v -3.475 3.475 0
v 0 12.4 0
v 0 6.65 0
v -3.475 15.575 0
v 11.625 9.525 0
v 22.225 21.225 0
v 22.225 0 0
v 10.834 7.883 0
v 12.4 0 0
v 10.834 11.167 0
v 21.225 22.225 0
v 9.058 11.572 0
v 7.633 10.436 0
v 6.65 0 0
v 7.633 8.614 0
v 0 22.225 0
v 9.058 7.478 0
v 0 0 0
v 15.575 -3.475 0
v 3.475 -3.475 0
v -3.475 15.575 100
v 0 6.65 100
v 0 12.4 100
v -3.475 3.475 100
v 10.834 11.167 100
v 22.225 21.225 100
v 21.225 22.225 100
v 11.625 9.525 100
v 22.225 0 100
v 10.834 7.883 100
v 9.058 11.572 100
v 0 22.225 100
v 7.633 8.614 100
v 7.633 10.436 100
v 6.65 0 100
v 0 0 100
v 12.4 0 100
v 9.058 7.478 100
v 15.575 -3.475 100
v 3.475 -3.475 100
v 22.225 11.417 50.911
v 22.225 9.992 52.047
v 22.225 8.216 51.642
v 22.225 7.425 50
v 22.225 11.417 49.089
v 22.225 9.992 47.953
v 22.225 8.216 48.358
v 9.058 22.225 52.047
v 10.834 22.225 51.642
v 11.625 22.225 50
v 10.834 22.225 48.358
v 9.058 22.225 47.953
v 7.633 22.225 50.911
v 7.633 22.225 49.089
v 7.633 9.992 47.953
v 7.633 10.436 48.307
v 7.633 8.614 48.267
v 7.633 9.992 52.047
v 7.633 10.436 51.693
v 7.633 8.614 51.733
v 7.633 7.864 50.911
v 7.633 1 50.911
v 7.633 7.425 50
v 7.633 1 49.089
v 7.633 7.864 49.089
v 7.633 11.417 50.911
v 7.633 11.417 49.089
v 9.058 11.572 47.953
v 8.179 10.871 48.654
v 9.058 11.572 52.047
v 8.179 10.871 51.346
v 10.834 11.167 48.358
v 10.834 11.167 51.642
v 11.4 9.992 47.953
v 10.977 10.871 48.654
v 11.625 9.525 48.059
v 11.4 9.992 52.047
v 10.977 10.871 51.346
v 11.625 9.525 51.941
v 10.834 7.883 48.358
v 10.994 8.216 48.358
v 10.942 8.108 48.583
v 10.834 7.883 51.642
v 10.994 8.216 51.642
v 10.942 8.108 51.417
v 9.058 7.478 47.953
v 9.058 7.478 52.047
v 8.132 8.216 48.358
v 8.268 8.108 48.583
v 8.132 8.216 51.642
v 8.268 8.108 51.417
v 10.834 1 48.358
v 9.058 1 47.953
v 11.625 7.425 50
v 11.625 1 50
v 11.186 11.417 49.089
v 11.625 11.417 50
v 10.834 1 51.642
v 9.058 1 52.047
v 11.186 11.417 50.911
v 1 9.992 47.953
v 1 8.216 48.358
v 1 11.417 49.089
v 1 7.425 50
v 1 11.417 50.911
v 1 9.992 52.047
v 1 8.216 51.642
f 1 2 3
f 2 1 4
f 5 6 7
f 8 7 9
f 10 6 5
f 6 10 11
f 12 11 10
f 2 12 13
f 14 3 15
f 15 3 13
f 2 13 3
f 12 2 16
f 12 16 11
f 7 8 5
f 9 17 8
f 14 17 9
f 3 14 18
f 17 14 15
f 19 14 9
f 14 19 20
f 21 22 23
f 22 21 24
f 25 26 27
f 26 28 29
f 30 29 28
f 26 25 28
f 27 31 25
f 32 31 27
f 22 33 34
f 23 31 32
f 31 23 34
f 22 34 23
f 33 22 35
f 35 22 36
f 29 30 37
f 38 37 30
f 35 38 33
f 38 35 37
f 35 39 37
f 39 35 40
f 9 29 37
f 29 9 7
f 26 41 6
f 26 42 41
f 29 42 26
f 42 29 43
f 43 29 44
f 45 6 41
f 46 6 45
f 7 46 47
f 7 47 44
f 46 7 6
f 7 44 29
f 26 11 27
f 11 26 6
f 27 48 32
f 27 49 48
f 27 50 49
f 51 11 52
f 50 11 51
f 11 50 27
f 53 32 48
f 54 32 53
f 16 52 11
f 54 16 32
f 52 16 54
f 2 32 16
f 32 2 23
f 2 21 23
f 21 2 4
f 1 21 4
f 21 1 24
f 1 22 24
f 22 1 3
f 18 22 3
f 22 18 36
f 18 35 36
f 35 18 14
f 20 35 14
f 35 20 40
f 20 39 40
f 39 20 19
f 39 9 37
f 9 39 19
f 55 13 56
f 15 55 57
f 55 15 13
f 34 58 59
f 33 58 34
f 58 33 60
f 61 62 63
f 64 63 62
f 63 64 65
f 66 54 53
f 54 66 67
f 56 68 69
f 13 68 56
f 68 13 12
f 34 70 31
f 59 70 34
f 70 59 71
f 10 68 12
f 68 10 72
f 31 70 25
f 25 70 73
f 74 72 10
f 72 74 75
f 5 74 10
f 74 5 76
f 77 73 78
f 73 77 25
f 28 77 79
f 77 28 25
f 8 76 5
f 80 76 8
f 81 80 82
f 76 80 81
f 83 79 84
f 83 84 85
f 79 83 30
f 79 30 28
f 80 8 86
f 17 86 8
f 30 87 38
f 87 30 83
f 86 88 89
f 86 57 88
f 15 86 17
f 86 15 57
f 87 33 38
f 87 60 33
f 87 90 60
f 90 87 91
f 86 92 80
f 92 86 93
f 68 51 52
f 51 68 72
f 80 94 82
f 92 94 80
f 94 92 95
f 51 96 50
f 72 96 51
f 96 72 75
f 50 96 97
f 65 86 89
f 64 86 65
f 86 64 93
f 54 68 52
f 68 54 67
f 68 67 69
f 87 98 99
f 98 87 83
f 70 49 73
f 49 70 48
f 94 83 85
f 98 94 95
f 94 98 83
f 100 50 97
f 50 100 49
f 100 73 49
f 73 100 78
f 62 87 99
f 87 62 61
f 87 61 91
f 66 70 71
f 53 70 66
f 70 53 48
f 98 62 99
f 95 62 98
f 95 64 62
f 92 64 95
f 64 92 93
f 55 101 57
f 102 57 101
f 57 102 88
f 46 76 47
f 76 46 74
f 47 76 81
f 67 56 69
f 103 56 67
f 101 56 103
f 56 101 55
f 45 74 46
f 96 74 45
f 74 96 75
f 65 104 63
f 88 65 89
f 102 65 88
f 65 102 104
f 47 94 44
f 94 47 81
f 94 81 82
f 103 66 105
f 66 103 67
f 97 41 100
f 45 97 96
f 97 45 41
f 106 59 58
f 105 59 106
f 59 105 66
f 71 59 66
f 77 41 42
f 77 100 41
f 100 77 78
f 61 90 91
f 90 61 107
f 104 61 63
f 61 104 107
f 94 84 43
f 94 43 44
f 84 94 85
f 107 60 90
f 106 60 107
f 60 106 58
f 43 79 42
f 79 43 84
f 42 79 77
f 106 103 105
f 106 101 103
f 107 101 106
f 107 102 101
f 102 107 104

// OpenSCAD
include <MCAD/units.scad>
use <MCAD/metric_fastners.scad>

// Height in mm
height = 100;

// Dovetail on second side?
dovetail = true;

// Bolt holes on second side?
bolts = false;

hole_dia = 4.2 * mm; // drill size for 5mm tap
width = (7/8) * inch;
tol = 0.3 * mm;

difference() {
  linear_extrude(height) {
    difference() {
      if (dovetail) {
        poly = [
          [0, 0],
          [0, ((1/4) * inch) + tol],
          [(-(1/8) * inch) - tol, ((1/8) * inch) + tol],
          [(-(1/8) * inch) - tol, ((5/8) * inch) - tol],
          [0, ((1/2) * inch) - tol],
          [0, width], [width - 1, width],
          [width, width - 1],
          [width, 0],
          [((1/2) * inch) - tol, 0],
          [((5/8) * inch) - tol, (-(1/8) * inch) - tol],
          [((1/8) * inch) + tol, (-(1/8) * inch) - tol], 
          [((1/4) * inch) + tol, 0], [0,0]];
        polygon(poly);
      } else {
        poly = [
          [0, 0],
          [0, ((1/4) * inch) + tol],
          [(-(1/8) * inch) - tol, ((1/8) * inch) + tol],
          [(-(1/8) * inch) - tol, ((5/8) * inch) - tol],
          [0, ((1/2) * inch) - tol],
          [0, width],
          [width - 1, width],
          [width, width - 1],
          [width, 1],
          [width - 1, 0],
          [0,0]];
        polygon(poly);
      }
      translate([(3/8) * inch, (3/8) * inch])
        circle(d = hole_dia);
    };
  }
  
  translate([(3/8) * inch, dovetail ? 1 : -1, height / 2])
    rotate([-90, 0, 0])
    cylinder(h = width * 2 + 2, d = hole_dia);
  translate([1, (3/8) * inch, height / 2])
    rotate([-90, 0, -90])
    cylinder(h = width * 2 + 2, d = hole_dia);

  if (bolts) {
    translate([(1/8) * inch, width, (1/2) * inch])
      rotate([90, 0, 0])
      csk_bolt(3, width + 4);
    translate([(5/8) * inch, width, (1/2) * inch])
      rotate([90, 0, 0])
      csk_bolt(3, width + 4);
    
    translate([(1/8) * inch, width, height - ((1/2) * inch)])
      rotate([90, 0, 0])
      csk_bolt(3, width + 4);
    translate([(5/8) * inch, width, height - ((1/2) * inch)])
      rotate([90, 0, 0])
      csk_bolt(3, width + 4);
   }
}
